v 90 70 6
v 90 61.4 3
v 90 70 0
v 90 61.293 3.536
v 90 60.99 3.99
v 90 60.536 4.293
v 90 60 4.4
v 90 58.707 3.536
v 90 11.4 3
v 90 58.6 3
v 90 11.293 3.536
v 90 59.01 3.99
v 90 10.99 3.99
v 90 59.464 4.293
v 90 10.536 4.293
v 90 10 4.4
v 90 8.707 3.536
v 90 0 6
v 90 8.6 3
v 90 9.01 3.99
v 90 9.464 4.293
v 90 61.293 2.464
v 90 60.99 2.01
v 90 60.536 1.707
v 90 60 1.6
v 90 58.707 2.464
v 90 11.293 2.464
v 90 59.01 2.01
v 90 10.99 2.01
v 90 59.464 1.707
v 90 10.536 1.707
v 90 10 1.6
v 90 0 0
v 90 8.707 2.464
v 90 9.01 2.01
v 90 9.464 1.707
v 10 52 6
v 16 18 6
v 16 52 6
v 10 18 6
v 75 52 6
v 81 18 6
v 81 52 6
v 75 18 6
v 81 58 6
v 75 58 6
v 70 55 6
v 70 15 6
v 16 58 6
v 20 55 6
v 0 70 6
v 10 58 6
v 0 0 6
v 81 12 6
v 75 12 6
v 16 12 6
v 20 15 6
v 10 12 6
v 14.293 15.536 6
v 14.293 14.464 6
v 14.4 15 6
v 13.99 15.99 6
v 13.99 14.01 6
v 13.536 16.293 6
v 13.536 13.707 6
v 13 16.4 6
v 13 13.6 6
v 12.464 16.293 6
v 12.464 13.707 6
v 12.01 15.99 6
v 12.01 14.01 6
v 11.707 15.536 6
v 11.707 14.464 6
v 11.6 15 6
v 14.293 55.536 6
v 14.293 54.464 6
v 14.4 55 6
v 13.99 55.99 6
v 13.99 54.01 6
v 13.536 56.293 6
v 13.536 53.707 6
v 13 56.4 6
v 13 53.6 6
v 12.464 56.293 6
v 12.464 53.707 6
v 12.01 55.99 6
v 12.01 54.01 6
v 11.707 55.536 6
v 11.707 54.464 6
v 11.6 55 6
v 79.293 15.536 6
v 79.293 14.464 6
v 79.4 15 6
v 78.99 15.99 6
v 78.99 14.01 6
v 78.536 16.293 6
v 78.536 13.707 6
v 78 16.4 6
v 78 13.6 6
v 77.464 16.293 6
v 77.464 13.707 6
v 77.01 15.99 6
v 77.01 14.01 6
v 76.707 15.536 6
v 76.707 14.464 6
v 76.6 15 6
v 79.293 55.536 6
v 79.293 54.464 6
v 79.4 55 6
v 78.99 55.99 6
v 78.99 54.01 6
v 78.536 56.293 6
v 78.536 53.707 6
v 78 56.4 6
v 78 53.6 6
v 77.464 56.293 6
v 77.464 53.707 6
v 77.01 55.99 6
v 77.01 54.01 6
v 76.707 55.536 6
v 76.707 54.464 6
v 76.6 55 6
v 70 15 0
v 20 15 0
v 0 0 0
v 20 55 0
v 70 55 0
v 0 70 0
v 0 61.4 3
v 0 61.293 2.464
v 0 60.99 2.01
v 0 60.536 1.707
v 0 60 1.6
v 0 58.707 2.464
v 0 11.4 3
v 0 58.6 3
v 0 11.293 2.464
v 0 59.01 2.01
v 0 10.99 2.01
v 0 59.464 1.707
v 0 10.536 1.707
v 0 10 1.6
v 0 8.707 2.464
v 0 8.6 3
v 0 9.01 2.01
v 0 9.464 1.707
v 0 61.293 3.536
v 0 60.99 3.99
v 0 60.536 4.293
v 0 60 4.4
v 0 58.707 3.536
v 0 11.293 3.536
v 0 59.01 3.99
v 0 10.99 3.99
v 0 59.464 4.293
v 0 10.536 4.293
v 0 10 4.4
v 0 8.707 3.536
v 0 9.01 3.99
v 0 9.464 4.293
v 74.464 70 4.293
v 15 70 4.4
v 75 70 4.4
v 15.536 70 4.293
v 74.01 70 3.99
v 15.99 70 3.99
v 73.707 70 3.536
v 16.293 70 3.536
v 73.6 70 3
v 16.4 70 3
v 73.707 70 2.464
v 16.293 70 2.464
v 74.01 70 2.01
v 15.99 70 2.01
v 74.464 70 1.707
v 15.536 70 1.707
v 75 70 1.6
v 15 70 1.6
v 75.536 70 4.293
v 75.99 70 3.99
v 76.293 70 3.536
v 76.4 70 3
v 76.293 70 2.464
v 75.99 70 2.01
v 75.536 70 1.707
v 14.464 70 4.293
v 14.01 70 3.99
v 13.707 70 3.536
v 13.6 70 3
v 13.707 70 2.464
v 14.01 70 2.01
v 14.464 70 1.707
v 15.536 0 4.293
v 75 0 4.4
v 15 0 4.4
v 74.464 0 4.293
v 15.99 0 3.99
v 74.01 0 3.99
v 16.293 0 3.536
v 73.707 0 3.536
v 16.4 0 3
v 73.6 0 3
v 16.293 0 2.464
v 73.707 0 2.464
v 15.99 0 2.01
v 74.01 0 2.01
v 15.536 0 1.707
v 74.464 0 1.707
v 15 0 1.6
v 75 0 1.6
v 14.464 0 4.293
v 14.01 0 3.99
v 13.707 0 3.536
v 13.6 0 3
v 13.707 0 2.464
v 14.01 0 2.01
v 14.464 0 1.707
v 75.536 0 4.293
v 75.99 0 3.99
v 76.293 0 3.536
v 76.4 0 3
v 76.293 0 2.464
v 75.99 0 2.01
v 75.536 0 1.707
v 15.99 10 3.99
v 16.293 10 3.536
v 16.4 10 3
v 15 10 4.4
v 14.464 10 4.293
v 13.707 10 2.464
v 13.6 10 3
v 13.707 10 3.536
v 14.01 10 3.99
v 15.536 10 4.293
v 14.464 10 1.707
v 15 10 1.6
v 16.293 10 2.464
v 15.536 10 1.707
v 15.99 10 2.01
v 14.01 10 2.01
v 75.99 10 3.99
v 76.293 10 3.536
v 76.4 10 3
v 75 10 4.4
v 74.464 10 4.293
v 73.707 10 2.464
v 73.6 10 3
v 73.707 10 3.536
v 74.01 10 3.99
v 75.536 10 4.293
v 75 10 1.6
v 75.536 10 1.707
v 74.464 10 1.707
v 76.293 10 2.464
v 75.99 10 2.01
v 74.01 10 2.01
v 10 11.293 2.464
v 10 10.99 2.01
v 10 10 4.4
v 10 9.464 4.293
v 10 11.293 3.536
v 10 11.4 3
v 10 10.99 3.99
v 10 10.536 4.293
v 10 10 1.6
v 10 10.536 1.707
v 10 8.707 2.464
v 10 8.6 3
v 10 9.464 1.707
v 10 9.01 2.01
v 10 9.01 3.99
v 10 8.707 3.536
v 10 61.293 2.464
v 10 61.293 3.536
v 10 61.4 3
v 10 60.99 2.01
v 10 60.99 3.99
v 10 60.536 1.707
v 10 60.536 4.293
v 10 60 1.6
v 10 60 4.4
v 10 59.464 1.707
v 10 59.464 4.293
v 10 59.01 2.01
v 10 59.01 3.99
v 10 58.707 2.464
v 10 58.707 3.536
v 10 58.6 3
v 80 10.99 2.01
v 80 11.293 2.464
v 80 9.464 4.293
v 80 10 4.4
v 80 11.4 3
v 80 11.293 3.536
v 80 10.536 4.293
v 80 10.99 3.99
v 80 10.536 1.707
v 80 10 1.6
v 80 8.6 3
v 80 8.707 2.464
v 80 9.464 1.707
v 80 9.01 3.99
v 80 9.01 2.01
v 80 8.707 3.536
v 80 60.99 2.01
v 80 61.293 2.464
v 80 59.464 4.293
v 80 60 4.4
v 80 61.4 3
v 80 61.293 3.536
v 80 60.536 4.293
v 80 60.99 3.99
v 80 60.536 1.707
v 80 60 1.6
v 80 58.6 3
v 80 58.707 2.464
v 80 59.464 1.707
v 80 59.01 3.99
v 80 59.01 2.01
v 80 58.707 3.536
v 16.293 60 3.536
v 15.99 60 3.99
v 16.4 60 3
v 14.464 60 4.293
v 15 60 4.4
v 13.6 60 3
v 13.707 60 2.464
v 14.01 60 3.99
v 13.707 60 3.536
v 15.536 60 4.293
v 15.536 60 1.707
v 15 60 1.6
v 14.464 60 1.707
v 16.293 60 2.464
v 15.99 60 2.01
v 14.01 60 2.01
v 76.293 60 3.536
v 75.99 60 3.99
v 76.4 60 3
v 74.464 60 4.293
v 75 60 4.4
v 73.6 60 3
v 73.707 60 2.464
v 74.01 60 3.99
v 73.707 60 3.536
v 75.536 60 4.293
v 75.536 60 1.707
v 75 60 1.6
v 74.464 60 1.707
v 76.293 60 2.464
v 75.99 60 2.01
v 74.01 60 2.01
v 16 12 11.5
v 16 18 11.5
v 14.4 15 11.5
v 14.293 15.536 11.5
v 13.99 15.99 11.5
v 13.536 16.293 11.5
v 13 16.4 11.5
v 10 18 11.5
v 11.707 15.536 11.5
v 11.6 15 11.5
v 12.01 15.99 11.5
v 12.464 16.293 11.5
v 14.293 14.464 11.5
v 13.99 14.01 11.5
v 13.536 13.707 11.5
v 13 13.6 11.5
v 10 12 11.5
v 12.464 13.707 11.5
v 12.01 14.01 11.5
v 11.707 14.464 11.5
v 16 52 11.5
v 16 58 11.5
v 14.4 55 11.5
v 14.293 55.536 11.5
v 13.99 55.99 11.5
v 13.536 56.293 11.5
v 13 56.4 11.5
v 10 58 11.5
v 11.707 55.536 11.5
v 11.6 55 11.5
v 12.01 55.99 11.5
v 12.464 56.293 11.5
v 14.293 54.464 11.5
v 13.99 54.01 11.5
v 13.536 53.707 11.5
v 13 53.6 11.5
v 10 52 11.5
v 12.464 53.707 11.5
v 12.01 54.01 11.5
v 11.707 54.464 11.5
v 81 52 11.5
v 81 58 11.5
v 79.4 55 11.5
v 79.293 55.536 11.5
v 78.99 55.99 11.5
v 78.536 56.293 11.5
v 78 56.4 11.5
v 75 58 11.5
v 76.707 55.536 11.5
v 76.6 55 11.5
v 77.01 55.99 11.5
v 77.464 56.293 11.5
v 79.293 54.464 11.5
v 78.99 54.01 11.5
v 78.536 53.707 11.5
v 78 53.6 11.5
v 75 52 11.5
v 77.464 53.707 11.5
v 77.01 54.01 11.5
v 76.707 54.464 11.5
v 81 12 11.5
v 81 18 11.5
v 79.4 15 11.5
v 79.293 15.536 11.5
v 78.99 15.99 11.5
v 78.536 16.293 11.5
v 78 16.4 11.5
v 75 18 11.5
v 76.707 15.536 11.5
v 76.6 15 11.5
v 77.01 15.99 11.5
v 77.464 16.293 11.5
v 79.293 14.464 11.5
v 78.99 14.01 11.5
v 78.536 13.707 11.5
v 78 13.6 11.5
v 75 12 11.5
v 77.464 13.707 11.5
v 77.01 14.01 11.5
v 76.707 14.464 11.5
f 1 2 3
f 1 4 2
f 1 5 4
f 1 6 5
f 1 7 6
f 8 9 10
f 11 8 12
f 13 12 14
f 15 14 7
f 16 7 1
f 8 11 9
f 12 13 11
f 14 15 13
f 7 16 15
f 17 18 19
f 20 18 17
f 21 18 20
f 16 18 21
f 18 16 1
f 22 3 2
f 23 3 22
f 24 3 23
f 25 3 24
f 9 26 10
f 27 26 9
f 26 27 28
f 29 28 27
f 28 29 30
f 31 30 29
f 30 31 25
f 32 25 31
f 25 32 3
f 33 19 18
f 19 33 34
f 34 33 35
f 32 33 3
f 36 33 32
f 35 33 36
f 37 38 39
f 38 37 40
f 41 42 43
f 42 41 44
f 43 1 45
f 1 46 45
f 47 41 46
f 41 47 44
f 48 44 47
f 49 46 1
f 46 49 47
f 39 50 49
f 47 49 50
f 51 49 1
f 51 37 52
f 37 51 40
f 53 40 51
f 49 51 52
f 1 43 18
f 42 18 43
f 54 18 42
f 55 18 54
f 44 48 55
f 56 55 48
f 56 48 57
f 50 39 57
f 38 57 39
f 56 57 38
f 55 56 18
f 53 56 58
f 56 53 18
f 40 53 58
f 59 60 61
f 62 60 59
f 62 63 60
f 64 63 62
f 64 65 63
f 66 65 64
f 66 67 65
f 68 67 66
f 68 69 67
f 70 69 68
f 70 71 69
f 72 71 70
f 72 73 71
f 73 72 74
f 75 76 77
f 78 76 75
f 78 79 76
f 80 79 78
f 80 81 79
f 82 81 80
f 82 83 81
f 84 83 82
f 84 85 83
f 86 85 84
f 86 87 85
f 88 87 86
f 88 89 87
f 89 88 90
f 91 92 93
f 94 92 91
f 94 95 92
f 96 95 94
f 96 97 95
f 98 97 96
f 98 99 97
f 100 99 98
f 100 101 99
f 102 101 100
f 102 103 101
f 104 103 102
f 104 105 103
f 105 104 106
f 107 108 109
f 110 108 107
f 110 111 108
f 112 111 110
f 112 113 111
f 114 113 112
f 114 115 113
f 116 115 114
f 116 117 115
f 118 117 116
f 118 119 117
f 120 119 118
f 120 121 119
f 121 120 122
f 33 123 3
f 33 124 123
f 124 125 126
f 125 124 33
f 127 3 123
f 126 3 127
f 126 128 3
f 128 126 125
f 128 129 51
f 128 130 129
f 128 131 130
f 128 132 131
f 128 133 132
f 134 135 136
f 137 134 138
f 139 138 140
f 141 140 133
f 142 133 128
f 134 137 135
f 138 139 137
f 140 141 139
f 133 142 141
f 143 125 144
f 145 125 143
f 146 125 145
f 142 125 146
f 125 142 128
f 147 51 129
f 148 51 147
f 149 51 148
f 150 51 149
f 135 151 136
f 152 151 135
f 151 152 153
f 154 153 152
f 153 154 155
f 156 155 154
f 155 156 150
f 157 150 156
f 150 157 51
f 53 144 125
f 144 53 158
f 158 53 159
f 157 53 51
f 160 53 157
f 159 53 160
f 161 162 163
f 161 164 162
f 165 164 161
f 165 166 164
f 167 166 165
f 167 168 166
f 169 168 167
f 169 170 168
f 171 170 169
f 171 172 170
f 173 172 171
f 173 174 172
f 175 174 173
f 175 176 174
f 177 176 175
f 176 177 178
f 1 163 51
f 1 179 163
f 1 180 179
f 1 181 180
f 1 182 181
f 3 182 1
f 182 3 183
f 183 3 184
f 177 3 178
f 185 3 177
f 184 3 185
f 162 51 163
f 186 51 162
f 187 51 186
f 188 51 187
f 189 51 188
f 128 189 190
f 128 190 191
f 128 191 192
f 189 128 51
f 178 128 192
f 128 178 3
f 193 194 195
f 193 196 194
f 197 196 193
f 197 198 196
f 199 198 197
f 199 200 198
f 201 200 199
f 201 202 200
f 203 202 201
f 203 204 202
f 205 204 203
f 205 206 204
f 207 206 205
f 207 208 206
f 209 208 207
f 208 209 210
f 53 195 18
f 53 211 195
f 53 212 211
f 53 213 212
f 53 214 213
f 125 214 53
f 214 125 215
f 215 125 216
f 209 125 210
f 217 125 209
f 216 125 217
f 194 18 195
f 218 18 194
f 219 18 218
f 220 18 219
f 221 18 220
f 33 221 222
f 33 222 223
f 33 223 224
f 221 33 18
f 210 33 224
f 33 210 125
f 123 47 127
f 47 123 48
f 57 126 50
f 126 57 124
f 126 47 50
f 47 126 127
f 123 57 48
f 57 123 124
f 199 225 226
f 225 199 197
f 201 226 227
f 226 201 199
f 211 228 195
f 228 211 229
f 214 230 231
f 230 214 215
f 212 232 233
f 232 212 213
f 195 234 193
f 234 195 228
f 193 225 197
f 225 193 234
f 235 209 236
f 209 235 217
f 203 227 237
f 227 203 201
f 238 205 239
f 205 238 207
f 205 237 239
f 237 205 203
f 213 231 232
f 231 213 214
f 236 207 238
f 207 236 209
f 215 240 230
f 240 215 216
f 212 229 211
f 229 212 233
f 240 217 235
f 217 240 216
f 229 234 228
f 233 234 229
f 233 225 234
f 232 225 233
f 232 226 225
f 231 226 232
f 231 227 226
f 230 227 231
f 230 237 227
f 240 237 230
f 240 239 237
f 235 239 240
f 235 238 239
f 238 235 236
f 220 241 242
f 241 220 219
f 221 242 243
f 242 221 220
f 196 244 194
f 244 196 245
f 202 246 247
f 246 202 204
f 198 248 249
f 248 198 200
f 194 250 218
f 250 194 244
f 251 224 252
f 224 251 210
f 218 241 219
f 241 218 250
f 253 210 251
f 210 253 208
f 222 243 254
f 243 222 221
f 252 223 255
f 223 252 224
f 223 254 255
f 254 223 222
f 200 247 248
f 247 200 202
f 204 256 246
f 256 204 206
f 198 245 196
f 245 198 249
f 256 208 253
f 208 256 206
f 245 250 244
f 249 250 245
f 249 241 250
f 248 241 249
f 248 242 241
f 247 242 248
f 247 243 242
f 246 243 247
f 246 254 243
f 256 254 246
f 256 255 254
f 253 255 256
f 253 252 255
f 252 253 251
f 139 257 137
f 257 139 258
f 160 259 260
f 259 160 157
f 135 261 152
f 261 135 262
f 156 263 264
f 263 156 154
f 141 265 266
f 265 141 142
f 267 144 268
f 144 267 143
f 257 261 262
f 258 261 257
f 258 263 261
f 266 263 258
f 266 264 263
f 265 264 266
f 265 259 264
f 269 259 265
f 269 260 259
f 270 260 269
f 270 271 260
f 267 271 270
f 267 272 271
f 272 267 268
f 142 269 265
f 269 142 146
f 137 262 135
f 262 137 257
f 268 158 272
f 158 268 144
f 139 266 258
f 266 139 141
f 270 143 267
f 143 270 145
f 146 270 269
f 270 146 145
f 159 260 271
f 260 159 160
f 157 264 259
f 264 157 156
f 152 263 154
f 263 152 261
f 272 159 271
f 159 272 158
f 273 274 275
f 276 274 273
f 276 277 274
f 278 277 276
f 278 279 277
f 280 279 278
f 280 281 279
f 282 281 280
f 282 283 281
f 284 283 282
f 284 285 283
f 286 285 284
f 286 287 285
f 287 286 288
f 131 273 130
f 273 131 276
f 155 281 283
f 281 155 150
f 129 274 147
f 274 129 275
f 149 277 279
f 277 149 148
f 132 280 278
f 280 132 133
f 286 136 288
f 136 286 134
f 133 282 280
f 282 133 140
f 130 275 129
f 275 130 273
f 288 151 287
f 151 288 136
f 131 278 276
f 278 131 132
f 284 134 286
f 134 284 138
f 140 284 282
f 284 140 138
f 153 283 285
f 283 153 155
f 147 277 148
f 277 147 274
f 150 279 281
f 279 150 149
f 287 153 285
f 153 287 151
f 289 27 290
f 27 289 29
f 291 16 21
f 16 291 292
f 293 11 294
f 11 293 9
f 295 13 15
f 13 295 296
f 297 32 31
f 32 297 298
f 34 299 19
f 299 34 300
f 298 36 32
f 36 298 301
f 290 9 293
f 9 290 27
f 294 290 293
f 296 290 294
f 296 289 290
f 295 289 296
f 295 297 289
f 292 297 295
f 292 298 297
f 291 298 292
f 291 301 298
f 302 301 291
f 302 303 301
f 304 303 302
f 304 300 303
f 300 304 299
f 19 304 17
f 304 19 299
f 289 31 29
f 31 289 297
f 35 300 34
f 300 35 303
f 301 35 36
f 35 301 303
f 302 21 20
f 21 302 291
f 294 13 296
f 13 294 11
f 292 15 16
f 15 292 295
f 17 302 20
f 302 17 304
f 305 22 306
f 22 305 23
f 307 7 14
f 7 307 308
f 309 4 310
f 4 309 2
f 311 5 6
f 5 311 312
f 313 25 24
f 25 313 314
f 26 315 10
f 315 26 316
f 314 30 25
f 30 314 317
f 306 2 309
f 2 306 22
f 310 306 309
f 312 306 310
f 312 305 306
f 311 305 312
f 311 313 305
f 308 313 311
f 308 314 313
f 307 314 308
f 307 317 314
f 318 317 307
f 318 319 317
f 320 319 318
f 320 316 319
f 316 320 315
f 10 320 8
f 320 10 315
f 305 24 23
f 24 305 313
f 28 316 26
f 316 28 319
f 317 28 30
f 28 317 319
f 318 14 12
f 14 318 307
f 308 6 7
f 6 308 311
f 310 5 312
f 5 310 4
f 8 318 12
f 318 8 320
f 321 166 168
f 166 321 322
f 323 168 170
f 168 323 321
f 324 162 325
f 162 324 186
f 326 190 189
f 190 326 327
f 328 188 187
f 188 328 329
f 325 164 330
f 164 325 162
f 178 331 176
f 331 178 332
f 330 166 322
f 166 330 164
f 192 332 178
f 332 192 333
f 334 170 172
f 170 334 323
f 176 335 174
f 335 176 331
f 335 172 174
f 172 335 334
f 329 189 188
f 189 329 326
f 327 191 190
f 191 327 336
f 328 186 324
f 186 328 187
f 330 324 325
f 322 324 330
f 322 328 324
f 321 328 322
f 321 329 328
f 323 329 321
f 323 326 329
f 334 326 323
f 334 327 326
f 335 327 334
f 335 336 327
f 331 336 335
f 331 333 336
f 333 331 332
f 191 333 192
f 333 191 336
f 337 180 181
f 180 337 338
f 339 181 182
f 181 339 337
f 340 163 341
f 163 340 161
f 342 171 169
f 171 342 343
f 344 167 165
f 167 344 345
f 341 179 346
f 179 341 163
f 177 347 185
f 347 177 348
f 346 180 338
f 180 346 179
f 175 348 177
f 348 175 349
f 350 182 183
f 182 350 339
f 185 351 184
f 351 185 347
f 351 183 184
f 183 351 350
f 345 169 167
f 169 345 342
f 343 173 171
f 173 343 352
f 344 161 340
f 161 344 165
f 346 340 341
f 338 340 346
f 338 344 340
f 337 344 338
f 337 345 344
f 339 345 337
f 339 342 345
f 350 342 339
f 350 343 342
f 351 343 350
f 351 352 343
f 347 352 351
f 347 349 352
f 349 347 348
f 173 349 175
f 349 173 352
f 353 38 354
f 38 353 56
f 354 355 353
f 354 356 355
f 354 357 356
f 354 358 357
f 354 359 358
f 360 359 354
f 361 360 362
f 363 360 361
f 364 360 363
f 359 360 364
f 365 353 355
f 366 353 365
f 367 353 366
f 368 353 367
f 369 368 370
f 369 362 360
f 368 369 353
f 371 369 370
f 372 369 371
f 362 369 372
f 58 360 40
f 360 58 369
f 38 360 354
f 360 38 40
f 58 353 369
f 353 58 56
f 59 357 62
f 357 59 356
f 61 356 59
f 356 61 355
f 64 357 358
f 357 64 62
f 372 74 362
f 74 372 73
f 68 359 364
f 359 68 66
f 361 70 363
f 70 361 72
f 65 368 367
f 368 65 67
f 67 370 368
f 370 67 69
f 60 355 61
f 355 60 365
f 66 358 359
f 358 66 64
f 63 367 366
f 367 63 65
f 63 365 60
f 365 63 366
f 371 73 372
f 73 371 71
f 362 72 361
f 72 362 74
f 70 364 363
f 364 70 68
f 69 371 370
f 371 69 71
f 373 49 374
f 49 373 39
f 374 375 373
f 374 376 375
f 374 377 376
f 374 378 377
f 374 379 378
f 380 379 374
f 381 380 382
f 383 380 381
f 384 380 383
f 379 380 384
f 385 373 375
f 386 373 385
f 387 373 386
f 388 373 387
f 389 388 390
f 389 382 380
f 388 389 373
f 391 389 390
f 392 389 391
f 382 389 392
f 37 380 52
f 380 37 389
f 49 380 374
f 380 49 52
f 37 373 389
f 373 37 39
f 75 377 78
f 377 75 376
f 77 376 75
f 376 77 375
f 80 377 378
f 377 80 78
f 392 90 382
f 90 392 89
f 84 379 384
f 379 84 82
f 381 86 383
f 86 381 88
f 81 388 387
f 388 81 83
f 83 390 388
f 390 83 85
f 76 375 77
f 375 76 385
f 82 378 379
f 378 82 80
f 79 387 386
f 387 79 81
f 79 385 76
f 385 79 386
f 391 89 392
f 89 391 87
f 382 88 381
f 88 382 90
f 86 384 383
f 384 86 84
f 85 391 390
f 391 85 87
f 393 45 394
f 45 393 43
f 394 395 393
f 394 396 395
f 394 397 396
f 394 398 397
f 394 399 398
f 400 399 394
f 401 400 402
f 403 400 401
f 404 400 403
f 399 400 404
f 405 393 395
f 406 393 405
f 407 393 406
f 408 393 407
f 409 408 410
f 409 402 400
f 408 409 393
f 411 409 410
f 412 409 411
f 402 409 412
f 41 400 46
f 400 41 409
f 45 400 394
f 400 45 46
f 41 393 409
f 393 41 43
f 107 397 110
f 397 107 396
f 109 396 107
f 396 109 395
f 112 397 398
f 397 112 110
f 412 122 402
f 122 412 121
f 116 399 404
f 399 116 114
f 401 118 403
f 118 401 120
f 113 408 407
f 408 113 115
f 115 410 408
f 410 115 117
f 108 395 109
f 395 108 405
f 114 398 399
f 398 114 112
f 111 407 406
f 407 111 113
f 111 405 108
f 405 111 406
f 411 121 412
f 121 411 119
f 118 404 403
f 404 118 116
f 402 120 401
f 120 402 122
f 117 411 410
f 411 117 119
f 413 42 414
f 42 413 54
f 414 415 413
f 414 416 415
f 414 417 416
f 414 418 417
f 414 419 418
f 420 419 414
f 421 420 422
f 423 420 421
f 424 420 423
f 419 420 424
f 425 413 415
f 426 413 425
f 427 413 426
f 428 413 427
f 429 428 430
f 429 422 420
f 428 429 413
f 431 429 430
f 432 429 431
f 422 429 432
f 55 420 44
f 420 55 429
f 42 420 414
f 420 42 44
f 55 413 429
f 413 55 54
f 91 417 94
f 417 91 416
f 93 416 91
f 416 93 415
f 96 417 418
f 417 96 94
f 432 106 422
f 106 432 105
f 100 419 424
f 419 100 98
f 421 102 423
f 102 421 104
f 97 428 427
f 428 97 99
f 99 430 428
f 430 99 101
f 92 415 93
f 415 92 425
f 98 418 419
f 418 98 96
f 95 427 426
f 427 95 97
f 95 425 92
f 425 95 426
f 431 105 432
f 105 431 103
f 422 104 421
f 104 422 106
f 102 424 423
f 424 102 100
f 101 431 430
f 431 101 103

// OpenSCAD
base_x_size = 90;
base_y_size = 70;
base_z_size = 6;

tap_hole_depth = 10;
tap_hole_r = 2.8/2; //M3.0 - 0.2

difference(){
	cube(size = [base_x_size, base_y_size, base_z_size], center = false);
	
	//切り欠き
	translate([20,15,0]) {
		cube(size = [50, 40, 8], center = false);
	}
	
	//backパネルねじ穴
	translate( [15 ,tap_hole_depth/2, base_z_size/2] ) rotate(a = [90, 0, 0] ){
		cylinder( h = tap_hole_depth, r = tap_hole_r, center = true , $fn=16 );
	}
	translate( [base_x_size - 15, tap_hole_depth/2, base_z_size/2] ) rotate(a = [90, 0, 0] ){
		cylinder( h = tap_hole_depth, r = tap_hole_r, center = true , $fn=16 );
	}

	//サイドパネルねじ穴
	translate( [tap_hole_depth/2, 10, base_z_size/2] ) rotate(a = [0, 90, 00] ){
		cylinder( h = tap_hole_depth, r = tap_hole_r, center = true , $fn=16 );
	}
	translate( [ tap_hole_depth/2, base_y_size - 10, base_z_size/2] ) rotate(a = [0, 90, 00] ){
		cylinder( h = tap_hole_depth, r = tap_hole_r, center = true , $fn=16 );
	}
	translate( [base_x_size - tap_hole_depth/2, 10, base_z_size/2] ) rotate(a = [0, 90, 00] ){
		cylinder( h = tap_hole_depth, r = tap_hole_r, center = true , $fn=16 );
	}
	translate( [base_x_size - tap_hole_depth/2, base_y_size - 10, base_z_size/2] ) rotate(a = [0, 90, 00] ){
		cylinder( h = tap_hole_depth, r = tap_hole_r, center = true , $fn=16 );
	}	

	//frontパネルねじ穴
	translate( [15 , base_y_size - tap_hole_depth/2, base_z_size/2] ) rotate(a = [90, 0, 0] ){
		cylinder( h = tap_hole_depth, r = tap_hole_r, center = true , $fn=16 );
	}
	translate( [base_x_size - 15, base_y_size - tap_hole_depth/2, base_z_size/2] ) rotate(a = [90, 0, 0] ){
		cylinder( h = tap_hole_depth, r = tap_hole_r, center = true , $fn=16 );
	}

}

pcb_mount_xy = 6;
pcb_mount_z = 5;
pcb_offset_x = 10;
pcb_offset_y = 15;
pcb_hole_x = 65;
pcb_hole_y = 40;

difference(){
	translate([pcb_offset_x + pcb_mount_xy/2 , pcb_offset_y, base_z_size+pcb_mount_z/2]) {
		cube(size = [pcb_mount_xy, pcb_mount_xy, base_z_size], center = true);
	}
	translate([pcb_offset_x + pcb_mount_xy/2 , pcb_offset_y, base_z_size+pcb_mount_z/2]) {
		cylinder( h = tap_hole_depth, r = tap_hole_r, center = true , $fn=16 );
	}
}

difference(){
	translate([pcb_offset_x + pcb_mount_xy/2 , pcb_offset_y + pcb_hole_y, base_z_size+pcb_mount_z/2]) {
		cube(size = [pcb_mount_xy, pcb_mount_xy, base_z_size], center = true);
	}
	translate([pcb_offset_x + pcb_mount_xy/2 , pcb_offset_y + pcb_hole_y, base_z_size+pcb_mount_z/2]) {
		cylinder( h = tap_hole_depth, r = tap_hole_r, center = true , $fn=16 );
	}
}

difference(){
	translate([pcb_offset_x + pcb_mount_xy/2 + pcb_hole_x , pcb_offset_y + pcb_hole_y, base_z_size+pcb_mount_z/2]) {
		cube(size = [pcb_mount_xy, pcb_mount_xy, base_z_size], center = true);
	}
	translate([pcb_offset_x + pcb_mount_xy/2 + pcb_hole_x , pcb_offset_y + pcb_hole_y, base_z_size+pcb_mount_z/2]) {
		cylinder( h = tap_hole_depth, r = tap_hole_r, center = true , $fn=16 );
	}
}

difference(){
	translate([pcb_offset_x + pcb_mount_xy/2 + pcb_hole_x , pcb_offset_y, base_z_size+pcb_mount_z/2]) {
		cube(size = [pcb_mount_xy, pcb_mount_xy, base_z_size], center = true);
	}
	translate([pcb_offset_x + pcb_mount_xy/2 + pcb_hole_x , pcb_offset_y, base_z_size+pcb_mount_z/2]) {
		cylinder( h = tap_hole_depth, r = tap_hole_r, center = true , $fn=16 );
	}
}
